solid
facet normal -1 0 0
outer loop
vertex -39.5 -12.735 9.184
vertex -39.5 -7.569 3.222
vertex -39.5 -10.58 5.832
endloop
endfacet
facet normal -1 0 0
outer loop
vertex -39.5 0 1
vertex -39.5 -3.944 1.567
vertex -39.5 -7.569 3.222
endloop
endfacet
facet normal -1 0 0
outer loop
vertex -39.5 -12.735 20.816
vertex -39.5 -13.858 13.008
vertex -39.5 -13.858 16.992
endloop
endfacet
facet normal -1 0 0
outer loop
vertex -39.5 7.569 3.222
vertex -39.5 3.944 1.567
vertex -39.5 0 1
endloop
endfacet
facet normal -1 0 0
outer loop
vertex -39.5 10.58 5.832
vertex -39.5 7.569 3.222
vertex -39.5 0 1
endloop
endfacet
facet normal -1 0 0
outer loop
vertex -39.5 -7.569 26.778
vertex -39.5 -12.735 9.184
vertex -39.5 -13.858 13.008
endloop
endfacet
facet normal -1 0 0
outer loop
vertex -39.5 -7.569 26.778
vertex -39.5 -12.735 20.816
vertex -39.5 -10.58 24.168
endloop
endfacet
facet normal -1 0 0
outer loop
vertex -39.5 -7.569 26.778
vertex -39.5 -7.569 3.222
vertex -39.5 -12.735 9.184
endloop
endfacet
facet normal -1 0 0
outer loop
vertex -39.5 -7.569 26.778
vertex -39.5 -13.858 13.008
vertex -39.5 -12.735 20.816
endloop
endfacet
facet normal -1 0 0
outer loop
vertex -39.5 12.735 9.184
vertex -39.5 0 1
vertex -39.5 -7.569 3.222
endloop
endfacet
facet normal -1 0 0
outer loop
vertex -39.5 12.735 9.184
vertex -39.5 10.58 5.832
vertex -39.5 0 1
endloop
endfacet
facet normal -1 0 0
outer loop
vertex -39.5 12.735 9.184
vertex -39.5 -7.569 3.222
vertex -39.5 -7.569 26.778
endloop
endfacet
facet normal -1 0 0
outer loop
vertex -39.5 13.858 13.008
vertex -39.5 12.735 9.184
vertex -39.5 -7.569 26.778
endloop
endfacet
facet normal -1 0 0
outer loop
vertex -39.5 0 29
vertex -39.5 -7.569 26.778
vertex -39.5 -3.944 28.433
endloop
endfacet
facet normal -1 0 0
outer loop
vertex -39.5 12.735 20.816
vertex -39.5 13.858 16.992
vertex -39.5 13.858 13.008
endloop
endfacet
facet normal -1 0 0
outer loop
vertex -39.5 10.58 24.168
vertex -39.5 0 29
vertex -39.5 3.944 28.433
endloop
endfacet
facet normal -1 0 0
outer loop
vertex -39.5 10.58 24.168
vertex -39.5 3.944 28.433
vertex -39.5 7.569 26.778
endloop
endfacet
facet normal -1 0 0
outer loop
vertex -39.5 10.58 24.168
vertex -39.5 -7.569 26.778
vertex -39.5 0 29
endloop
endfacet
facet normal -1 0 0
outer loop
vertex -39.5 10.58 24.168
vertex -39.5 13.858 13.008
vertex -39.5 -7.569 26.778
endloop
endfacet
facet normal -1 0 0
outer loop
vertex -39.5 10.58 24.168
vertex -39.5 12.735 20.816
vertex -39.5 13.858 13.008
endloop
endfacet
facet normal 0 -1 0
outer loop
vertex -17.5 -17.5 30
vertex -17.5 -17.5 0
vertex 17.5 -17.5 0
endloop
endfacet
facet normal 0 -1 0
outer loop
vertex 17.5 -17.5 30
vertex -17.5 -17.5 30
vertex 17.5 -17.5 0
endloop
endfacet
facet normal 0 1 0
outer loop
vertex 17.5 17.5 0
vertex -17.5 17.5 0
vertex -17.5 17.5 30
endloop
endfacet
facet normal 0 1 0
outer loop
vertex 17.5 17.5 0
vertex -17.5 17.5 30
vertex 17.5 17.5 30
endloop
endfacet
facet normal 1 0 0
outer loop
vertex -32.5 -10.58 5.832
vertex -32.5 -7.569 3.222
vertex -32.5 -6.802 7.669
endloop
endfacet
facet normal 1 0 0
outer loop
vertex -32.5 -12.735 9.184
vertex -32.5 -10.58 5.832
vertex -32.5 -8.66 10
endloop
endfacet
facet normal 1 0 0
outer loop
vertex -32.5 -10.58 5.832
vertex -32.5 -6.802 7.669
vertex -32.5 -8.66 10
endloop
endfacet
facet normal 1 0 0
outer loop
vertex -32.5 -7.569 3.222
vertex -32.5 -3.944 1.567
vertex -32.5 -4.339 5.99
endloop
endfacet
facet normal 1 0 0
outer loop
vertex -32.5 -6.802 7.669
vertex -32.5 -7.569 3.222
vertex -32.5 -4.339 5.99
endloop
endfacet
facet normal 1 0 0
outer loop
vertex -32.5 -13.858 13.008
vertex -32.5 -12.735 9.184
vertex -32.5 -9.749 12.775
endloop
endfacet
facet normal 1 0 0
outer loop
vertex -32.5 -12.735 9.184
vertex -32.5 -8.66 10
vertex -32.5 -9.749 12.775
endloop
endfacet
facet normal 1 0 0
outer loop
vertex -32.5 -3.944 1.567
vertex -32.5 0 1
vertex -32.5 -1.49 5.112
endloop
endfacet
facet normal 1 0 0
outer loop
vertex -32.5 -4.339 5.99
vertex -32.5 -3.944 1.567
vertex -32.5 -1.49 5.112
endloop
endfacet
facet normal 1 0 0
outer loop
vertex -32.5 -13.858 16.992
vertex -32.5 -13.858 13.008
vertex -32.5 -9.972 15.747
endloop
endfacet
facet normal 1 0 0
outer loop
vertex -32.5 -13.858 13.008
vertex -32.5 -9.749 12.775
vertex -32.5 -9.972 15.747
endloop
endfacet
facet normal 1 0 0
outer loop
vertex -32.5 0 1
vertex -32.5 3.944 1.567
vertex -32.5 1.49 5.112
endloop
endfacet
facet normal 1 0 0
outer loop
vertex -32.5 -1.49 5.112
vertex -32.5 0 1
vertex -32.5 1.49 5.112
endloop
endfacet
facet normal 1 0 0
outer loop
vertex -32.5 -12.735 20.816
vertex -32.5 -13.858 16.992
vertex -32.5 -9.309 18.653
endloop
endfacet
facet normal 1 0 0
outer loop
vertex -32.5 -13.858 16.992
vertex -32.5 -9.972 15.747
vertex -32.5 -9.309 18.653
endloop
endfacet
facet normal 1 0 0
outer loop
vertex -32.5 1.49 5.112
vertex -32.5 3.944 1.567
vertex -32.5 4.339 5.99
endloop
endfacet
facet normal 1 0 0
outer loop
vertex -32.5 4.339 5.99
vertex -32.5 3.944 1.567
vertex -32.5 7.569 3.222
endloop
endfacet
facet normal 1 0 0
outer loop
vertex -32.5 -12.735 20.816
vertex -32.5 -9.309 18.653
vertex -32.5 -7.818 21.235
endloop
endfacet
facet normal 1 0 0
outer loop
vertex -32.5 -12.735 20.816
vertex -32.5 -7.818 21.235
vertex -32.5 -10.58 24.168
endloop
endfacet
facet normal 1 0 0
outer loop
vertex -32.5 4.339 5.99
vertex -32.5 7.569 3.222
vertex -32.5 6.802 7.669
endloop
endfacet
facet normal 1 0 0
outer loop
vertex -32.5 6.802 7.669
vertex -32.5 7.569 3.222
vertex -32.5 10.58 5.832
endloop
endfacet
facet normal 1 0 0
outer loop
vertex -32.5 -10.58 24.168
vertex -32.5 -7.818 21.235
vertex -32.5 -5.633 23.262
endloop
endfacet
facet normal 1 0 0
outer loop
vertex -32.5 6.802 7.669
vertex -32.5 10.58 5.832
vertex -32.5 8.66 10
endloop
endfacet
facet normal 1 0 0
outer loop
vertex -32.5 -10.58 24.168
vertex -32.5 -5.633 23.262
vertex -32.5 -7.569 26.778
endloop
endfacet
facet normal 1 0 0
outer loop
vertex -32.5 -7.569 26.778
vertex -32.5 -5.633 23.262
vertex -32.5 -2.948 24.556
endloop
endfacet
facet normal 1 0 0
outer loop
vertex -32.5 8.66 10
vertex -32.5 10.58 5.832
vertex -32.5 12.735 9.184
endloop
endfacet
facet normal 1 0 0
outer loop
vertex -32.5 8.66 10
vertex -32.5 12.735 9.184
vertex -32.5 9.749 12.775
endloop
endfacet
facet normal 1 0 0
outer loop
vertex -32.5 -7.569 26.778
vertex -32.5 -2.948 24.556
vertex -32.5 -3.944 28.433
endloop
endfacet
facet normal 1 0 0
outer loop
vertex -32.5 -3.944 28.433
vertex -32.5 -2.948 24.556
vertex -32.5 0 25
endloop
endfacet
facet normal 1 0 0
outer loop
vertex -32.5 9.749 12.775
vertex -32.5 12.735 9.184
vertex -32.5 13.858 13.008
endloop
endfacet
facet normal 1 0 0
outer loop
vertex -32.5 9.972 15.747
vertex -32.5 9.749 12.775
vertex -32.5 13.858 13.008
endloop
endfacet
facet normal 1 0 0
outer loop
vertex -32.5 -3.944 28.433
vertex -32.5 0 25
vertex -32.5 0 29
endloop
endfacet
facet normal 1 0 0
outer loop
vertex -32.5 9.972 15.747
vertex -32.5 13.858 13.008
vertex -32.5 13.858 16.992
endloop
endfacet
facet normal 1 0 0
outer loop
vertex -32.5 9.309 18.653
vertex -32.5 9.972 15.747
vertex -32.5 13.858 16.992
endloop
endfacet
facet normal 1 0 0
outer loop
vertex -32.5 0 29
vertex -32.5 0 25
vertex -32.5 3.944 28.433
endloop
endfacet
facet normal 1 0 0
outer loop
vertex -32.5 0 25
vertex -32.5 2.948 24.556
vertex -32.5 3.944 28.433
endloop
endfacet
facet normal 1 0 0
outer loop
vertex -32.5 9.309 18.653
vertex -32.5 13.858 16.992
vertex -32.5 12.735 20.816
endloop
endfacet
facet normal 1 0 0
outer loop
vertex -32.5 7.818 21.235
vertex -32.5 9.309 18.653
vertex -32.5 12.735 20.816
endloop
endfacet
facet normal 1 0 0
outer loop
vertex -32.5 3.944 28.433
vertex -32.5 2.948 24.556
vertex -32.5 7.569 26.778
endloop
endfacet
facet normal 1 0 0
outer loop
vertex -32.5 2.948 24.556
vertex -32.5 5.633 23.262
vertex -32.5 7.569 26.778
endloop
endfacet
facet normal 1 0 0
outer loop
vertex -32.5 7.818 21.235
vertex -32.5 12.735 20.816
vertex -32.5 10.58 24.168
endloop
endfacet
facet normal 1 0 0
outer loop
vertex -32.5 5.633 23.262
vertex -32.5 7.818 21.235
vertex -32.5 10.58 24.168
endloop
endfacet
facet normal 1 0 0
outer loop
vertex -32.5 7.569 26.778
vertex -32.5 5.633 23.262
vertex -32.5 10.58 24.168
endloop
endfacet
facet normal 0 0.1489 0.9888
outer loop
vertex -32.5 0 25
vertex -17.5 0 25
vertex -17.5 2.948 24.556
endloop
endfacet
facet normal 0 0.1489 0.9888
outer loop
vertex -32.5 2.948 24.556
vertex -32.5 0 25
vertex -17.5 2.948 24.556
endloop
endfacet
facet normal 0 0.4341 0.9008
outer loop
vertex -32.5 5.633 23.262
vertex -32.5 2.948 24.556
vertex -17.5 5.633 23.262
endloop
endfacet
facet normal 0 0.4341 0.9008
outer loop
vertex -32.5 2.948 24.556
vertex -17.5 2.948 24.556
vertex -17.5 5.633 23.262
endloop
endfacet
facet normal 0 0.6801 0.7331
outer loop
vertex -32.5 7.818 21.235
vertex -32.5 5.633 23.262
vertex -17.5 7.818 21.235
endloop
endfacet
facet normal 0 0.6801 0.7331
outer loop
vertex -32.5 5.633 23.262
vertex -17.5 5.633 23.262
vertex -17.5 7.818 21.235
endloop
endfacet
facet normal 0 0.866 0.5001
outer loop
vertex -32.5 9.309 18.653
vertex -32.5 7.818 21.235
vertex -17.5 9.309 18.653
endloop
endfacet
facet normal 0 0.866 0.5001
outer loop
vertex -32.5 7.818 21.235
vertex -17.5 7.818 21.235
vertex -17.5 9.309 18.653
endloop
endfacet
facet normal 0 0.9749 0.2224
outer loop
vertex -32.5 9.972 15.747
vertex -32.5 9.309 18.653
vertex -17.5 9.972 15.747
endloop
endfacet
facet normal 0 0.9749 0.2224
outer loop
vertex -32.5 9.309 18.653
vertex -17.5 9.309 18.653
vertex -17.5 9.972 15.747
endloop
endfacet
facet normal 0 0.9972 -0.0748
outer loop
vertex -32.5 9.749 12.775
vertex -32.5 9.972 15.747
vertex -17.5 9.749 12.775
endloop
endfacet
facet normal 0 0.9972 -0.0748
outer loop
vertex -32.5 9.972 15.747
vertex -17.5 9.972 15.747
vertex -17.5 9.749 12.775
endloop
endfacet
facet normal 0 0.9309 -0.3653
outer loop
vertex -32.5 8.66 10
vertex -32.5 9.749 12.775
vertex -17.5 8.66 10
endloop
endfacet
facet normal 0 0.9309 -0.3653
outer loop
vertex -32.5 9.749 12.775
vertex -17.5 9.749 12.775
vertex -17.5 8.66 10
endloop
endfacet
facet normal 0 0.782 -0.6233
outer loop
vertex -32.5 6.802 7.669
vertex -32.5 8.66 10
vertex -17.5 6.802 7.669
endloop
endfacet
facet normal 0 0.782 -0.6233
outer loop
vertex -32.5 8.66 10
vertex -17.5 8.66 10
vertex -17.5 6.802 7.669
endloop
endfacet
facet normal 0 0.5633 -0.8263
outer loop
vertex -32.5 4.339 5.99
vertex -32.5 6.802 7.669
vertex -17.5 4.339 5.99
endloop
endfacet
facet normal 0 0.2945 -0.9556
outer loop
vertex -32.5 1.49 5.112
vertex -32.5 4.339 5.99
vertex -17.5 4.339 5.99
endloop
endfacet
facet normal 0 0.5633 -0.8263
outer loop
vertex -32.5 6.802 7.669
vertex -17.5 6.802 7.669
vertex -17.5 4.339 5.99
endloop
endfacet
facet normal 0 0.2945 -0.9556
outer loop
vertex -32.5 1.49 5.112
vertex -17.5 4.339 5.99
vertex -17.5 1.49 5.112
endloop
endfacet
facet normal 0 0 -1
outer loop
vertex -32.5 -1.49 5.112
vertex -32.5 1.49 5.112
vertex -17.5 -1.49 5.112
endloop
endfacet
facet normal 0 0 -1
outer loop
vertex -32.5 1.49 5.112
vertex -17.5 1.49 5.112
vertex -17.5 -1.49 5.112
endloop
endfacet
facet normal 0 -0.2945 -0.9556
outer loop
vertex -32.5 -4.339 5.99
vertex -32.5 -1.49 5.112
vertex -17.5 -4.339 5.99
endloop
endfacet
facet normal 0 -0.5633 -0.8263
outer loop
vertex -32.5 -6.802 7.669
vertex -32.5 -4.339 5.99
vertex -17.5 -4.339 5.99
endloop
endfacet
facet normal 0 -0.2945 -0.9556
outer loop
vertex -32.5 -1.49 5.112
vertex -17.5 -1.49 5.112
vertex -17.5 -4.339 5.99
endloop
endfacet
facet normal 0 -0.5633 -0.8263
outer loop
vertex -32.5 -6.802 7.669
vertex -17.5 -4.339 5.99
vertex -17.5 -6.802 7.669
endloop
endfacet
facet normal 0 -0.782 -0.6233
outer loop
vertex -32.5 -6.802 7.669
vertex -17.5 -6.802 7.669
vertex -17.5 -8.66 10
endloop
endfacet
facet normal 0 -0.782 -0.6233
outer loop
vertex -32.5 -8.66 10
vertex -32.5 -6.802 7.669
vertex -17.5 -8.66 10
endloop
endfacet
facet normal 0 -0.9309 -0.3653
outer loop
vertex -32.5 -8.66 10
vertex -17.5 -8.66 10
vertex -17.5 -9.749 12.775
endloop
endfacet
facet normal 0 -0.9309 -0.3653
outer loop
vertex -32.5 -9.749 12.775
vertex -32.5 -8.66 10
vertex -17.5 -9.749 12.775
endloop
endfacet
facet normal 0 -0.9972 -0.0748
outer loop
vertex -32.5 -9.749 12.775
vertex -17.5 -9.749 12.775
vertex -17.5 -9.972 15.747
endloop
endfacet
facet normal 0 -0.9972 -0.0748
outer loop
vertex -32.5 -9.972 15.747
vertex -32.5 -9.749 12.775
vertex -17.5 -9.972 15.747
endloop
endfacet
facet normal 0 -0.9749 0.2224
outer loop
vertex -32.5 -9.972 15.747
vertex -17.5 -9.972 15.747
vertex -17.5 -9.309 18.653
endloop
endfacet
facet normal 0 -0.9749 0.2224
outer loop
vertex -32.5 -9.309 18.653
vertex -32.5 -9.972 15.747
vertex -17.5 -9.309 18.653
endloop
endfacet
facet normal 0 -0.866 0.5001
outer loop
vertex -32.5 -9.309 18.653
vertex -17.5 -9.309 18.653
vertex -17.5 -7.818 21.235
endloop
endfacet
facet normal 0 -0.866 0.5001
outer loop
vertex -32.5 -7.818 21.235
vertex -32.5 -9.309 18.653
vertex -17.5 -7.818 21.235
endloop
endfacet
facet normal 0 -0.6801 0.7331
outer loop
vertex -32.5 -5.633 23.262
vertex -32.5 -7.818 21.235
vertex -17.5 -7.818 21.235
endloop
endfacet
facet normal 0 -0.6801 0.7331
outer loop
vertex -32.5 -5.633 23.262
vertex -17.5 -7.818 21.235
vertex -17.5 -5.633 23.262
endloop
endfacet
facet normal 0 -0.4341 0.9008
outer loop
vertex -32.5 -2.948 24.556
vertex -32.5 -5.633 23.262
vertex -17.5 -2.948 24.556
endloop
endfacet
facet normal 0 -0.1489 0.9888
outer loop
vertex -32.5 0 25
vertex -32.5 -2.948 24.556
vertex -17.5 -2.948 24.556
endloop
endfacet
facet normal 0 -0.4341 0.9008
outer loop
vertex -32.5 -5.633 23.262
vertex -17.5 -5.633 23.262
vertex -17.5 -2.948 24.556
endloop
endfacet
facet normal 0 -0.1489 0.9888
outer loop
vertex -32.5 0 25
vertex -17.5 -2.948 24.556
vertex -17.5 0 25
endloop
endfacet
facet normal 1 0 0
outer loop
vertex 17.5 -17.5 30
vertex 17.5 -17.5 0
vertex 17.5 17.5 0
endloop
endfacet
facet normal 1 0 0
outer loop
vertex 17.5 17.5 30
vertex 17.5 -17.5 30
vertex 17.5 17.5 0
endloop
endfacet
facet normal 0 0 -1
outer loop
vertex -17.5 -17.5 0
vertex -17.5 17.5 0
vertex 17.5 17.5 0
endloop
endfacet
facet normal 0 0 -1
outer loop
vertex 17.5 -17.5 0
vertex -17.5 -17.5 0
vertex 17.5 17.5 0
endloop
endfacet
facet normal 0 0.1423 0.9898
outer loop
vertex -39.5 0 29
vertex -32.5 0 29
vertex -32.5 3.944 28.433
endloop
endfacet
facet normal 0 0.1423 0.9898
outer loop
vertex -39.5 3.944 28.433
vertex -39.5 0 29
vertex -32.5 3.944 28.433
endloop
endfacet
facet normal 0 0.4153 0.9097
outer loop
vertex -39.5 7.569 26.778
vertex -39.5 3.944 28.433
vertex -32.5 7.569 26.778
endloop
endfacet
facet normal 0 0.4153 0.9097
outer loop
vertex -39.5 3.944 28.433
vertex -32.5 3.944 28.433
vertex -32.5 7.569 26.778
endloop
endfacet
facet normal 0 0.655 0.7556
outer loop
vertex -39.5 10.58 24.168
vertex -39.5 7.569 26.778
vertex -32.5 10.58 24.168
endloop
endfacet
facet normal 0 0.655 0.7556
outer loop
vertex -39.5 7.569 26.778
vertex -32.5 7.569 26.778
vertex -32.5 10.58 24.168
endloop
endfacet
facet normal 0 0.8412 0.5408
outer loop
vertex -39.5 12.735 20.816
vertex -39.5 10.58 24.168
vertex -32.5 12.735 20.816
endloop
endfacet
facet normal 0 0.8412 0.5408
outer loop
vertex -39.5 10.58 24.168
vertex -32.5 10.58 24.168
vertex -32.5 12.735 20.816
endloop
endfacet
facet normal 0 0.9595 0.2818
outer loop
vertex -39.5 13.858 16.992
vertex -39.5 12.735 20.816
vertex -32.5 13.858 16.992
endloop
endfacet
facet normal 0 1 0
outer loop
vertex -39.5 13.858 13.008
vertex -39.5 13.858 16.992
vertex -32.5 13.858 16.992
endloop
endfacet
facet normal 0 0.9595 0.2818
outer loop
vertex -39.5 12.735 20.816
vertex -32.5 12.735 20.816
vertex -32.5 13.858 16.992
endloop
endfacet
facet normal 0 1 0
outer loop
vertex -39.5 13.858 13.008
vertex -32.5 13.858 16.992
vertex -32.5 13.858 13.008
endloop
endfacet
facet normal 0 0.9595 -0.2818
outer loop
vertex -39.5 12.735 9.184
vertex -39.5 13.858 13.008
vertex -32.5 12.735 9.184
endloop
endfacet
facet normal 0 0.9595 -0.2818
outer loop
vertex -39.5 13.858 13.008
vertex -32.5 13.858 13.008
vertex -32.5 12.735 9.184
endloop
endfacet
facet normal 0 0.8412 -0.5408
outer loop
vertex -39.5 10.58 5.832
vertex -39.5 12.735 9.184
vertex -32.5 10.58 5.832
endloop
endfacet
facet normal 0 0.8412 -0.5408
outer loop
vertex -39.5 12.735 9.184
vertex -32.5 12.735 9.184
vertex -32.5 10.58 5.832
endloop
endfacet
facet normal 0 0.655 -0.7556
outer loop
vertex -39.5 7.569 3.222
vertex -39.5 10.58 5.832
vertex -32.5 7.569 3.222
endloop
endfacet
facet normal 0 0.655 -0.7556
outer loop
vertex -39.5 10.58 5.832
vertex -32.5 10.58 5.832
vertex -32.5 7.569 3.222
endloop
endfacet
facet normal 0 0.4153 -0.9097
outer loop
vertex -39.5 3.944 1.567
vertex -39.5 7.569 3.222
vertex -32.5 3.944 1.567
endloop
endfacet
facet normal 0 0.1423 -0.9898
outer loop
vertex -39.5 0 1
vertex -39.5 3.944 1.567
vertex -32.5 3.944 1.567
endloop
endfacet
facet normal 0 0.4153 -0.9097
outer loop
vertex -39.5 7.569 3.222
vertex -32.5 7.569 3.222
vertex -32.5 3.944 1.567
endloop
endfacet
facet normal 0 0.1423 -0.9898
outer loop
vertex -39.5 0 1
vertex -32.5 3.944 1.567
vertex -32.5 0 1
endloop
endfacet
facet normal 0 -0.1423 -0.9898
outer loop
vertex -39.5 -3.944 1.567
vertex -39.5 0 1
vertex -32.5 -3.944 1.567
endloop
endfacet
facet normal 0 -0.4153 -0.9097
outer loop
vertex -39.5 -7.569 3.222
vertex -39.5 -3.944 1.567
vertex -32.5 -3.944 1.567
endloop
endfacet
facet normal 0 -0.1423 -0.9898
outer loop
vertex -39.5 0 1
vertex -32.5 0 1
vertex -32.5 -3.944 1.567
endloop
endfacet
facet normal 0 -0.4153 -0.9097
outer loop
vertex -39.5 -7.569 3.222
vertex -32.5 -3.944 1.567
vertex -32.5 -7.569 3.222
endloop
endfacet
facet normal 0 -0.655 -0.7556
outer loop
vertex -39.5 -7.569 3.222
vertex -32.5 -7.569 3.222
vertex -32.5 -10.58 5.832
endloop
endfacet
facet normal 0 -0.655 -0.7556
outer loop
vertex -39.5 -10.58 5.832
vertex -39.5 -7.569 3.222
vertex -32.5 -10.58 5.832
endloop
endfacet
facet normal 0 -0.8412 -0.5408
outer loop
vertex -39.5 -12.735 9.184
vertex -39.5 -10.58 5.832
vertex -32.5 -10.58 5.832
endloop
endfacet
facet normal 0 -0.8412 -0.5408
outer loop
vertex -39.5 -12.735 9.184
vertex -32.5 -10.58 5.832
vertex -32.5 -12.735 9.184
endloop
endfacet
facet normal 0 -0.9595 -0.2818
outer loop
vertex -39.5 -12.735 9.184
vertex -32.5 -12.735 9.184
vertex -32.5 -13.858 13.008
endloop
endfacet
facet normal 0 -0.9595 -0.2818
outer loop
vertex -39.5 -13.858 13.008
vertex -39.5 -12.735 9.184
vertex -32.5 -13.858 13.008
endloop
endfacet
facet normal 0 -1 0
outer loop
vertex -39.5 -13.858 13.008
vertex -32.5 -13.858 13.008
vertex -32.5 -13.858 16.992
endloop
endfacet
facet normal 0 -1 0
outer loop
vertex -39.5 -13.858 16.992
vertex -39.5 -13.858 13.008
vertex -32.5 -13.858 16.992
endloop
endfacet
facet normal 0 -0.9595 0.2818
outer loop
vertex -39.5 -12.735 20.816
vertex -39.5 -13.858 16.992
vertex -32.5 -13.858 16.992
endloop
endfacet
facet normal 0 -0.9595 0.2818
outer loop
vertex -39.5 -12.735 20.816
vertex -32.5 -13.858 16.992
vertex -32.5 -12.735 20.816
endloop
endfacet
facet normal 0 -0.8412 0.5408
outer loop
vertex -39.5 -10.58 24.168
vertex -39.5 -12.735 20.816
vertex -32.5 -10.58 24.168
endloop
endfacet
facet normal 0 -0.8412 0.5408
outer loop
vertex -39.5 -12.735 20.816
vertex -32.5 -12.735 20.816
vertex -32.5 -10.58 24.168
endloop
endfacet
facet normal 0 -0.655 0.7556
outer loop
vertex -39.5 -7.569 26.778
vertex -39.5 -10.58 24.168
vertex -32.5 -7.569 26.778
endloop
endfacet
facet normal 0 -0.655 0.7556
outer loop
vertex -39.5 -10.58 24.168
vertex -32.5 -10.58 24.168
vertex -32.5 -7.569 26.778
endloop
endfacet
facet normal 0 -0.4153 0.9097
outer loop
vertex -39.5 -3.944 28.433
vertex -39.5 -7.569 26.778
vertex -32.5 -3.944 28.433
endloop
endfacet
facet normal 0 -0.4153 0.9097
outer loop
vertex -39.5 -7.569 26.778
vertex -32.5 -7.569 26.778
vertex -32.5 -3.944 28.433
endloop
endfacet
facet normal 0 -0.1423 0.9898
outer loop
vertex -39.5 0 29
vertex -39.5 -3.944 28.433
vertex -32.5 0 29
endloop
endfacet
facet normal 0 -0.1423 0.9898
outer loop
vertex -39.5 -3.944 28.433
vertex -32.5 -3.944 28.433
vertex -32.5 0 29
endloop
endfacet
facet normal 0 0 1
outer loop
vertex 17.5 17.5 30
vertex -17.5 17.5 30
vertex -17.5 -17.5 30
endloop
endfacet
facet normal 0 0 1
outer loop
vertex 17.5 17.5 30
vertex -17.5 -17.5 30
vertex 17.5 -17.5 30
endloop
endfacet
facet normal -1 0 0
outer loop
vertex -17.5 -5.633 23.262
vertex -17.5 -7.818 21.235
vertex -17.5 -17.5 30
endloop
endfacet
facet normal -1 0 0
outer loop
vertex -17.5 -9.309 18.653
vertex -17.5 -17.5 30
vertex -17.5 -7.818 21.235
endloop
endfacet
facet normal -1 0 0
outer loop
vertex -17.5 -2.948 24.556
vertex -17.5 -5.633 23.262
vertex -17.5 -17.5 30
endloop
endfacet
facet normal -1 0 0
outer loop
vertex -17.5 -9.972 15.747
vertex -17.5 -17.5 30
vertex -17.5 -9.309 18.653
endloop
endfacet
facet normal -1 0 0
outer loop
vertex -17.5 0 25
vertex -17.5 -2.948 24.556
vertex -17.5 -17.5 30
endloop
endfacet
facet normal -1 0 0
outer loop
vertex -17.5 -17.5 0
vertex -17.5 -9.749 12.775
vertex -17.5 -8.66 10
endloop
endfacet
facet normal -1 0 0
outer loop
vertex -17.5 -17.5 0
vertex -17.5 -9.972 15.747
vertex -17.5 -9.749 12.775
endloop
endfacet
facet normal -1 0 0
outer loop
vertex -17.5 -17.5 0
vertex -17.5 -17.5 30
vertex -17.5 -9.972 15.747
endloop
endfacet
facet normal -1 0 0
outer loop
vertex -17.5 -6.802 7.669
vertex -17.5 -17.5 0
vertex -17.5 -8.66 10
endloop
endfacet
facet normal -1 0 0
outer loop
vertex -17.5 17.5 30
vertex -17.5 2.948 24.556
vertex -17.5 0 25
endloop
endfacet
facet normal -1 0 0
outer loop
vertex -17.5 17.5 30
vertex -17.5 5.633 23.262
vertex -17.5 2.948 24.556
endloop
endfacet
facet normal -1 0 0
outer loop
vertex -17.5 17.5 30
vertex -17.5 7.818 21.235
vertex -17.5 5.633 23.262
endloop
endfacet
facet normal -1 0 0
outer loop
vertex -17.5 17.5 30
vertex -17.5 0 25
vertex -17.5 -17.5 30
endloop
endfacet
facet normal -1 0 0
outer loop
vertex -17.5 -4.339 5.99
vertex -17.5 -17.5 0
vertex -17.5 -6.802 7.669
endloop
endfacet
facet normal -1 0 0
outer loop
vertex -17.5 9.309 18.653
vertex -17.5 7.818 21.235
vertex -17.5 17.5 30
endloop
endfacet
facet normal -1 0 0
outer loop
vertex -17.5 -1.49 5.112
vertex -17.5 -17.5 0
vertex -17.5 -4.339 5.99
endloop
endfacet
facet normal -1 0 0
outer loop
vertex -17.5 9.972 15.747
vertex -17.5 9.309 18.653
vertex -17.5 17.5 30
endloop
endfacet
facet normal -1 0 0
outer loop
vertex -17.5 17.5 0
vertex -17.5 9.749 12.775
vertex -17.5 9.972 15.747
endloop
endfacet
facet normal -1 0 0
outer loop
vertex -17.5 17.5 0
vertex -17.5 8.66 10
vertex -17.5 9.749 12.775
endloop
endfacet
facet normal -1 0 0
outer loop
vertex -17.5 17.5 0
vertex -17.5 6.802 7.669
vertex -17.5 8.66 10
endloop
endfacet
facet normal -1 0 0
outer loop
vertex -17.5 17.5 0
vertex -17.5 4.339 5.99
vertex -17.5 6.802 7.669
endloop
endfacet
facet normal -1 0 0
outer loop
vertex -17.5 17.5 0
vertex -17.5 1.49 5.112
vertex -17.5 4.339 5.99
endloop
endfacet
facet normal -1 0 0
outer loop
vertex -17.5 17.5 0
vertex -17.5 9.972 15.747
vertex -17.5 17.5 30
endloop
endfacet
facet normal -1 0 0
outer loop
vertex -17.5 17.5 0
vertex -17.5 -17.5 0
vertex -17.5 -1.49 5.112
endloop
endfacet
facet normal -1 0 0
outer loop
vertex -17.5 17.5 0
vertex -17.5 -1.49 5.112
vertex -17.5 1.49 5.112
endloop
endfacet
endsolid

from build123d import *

# Parameters (mm, degrees)
SKETCH1_W           = 35
SKETCH1_H           = 35
BOSS_EXTRUDE1_DEPTH = 30
SKETCH2_R           = 10
BOSS_EXTRUDE2_DEPTH = 15
SKETCH3_R           = 14
BOSS_EXTRUDE3_DEPTH = 7


with BuildPart() as part:
    # Sketch1 → Boss-Extrude1 (new body)
    with BuildSketch(Plane.XY):
        Rectangle(SKETCH1_W, SKETCH1_H)
    extrude(amount=BOSS_EXTRUDE1_DEPTH)

    # Sketch2 → Boss-Extrude2 (add)
    with BuildSketch(Plane.ZY.offset(17.5)):
        with Locations((15, 0)):
            Circle(SKETCH2_R)
    extrude(amount=BOSS_EXTRUDE2_DEPTH)

    # Sketch3 → Boss-Extrude3 (add)
    with BuildSketch(Plane.ZY.offset(32.5)):
        with Locations((15, 0)):
            Circle(SKETCH3_R)
    extrude(amount=BOSS_EXTRUDE3_DEPTH)


solid = part.part
